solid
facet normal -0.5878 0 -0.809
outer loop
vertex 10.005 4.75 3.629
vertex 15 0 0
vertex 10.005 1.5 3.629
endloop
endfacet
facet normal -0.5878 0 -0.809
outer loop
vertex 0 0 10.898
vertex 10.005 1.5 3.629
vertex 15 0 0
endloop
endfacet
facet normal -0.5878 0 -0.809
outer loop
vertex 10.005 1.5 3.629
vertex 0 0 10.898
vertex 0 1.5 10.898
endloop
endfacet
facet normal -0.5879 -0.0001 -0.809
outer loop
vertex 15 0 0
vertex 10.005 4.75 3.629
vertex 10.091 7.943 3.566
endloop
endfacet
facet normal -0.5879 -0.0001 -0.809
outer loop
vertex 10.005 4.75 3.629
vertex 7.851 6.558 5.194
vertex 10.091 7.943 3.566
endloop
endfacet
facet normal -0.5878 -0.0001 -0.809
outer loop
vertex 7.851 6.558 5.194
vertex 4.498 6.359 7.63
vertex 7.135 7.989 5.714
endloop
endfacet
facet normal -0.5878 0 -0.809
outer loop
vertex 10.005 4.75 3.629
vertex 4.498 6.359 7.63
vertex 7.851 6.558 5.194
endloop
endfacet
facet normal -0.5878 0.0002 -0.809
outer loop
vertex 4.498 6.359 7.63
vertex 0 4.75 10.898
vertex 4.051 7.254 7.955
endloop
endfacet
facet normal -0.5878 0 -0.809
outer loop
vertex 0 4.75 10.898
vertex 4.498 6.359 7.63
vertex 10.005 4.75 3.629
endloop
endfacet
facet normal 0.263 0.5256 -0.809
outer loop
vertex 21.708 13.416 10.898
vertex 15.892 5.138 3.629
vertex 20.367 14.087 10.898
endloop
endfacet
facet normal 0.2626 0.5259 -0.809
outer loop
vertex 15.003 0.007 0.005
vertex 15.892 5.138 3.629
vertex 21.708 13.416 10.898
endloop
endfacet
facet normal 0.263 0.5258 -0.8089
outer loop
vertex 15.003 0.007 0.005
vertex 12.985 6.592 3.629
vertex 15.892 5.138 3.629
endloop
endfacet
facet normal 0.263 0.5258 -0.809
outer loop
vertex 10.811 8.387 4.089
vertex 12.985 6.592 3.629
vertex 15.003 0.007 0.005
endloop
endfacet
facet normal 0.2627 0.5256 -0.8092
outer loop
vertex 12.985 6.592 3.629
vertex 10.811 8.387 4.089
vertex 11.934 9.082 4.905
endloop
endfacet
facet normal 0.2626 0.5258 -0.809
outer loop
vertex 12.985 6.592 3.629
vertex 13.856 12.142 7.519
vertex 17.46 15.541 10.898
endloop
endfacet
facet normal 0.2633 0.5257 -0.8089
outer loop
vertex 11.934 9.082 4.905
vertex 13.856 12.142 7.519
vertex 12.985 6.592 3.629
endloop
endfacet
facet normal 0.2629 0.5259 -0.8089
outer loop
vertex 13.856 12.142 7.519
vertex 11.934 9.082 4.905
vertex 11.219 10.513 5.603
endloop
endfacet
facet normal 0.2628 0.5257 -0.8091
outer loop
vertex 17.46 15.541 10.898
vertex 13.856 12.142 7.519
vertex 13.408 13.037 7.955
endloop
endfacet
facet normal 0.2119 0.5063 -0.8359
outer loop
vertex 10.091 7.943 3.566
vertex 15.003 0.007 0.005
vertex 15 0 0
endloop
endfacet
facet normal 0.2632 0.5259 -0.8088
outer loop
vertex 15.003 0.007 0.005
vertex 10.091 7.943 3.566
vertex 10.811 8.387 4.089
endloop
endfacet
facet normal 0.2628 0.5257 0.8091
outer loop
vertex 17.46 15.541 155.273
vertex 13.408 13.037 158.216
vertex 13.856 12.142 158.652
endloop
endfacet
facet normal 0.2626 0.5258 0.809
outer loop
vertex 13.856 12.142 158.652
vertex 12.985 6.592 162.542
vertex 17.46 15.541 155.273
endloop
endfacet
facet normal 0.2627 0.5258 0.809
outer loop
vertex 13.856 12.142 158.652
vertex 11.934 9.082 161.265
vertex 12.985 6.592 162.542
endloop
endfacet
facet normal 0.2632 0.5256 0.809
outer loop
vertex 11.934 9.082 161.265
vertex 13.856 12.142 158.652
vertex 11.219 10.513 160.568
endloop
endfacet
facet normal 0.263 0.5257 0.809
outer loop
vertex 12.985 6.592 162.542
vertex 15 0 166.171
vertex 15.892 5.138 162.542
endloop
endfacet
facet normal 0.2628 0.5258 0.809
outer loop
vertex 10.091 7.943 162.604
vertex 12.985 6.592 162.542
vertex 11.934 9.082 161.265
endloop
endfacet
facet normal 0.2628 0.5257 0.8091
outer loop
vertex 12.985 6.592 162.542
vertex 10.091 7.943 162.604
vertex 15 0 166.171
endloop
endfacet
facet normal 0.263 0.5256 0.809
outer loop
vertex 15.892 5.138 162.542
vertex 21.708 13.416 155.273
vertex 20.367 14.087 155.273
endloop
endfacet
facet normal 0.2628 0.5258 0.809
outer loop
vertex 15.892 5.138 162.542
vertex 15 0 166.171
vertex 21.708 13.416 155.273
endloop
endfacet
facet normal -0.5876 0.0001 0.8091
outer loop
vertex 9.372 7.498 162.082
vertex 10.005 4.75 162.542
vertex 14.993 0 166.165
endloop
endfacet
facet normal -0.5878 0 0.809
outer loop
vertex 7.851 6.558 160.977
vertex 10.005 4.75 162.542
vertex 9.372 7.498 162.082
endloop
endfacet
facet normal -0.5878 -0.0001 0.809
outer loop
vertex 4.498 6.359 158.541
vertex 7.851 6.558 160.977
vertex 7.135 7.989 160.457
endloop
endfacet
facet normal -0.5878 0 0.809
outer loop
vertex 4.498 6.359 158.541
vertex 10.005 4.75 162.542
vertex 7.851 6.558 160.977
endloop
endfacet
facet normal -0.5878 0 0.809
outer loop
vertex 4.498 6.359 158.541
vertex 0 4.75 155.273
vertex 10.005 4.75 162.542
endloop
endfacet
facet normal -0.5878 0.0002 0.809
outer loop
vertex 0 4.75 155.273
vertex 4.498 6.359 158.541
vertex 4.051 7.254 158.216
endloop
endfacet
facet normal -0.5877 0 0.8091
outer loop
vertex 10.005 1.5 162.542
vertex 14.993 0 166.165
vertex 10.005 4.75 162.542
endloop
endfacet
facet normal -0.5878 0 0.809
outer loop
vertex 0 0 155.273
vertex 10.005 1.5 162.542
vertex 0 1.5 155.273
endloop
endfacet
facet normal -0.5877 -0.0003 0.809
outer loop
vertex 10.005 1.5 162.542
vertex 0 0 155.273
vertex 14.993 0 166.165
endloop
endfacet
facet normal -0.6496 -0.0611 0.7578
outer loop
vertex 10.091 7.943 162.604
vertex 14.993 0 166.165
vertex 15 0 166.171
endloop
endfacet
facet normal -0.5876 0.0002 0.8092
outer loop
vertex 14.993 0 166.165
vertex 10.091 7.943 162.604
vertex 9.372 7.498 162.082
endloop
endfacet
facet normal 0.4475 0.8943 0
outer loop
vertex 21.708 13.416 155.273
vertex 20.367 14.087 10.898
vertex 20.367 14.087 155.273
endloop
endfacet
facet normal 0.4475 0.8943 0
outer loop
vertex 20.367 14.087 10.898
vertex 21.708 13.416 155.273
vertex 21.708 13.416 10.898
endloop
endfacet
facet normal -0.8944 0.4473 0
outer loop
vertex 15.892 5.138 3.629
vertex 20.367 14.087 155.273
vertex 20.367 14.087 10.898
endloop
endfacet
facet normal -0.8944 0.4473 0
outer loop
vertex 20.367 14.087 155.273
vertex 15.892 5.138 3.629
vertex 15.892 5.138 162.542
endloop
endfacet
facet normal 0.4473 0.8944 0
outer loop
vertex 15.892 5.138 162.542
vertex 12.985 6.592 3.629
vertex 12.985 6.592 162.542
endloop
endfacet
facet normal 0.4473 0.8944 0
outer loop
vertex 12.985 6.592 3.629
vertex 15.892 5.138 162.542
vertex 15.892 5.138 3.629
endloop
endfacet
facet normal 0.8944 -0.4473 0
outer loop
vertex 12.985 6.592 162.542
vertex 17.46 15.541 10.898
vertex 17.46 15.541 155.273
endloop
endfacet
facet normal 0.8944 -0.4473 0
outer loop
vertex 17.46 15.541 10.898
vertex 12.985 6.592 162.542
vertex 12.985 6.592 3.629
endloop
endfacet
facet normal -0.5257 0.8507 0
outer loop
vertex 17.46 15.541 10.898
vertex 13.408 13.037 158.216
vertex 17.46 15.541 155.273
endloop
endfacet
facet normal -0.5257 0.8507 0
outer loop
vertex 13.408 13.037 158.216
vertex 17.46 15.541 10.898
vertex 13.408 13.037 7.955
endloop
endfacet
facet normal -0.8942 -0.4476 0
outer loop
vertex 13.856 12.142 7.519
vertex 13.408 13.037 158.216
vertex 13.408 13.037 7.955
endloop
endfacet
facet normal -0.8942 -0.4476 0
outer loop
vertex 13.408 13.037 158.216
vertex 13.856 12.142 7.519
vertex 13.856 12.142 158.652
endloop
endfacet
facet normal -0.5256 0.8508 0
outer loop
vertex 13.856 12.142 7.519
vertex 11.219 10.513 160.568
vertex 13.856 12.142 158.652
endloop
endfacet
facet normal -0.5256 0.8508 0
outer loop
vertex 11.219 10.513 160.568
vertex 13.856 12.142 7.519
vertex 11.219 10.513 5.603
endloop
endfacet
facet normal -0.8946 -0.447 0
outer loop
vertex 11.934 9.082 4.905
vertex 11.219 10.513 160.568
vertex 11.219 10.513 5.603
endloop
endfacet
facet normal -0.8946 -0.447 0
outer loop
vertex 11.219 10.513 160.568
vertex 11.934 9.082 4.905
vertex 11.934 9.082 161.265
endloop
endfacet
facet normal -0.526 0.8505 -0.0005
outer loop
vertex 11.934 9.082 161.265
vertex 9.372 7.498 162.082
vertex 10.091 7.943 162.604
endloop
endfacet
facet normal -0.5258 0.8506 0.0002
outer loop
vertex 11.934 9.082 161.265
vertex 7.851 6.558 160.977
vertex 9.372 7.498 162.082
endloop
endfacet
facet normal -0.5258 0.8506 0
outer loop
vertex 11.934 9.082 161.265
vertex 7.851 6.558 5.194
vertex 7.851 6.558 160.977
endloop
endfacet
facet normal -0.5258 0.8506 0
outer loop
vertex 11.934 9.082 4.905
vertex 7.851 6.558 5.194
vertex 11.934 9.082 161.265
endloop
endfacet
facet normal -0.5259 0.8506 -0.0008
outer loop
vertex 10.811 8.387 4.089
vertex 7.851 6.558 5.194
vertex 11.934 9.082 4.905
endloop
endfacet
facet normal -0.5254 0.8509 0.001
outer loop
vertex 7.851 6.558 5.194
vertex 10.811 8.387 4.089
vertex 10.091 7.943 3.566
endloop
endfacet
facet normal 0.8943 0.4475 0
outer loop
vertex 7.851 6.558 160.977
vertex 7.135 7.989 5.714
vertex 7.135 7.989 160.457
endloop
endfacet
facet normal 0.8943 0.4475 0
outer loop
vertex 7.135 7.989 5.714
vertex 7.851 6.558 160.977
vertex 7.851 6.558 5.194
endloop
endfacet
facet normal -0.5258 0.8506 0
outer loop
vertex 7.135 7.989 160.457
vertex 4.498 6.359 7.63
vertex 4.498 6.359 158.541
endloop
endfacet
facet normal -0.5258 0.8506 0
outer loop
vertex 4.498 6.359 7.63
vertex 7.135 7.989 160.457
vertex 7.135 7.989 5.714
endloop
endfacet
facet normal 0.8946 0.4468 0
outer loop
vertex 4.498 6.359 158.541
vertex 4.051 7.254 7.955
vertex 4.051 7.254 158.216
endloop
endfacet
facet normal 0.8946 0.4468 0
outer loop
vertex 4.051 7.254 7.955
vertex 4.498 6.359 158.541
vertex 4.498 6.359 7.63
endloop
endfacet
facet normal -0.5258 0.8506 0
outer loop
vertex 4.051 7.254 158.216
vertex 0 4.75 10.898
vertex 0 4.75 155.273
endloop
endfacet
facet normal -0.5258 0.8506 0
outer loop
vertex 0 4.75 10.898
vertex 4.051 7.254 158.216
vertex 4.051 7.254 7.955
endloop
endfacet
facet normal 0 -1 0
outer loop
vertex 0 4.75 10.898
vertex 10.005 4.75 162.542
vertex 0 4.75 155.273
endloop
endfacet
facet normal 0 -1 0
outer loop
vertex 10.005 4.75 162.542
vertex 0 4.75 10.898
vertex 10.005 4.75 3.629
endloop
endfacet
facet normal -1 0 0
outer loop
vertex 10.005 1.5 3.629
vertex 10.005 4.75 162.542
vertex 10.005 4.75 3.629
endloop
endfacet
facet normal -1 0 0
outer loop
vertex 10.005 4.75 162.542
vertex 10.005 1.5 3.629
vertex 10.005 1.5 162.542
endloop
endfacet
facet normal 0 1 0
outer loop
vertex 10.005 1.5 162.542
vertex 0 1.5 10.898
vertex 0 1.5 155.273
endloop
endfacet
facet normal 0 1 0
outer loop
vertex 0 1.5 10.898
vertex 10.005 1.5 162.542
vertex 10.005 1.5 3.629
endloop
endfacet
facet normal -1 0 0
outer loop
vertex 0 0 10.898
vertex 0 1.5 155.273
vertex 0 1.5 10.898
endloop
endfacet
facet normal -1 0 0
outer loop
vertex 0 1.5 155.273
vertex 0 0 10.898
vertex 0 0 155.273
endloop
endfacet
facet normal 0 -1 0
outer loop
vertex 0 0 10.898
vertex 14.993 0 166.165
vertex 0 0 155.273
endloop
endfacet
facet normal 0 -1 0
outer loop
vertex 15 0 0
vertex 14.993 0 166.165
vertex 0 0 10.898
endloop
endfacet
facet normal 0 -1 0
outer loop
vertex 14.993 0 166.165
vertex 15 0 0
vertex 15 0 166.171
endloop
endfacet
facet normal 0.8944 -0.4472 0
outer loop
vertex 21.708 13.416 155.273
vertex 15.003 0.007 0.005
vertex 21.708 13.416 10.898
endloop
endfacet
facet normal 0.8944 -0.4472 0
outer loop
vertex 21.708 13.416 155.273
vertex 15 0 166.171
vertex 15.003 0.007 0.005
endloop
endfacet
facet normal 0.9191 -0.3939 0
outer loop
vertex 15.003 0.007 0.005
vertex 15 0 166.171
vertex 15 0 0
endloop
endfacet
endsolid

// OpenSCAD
// Regular Dodecahedron Edge Ribs


// Cf. https://github.com/openscad/openscad/issues/4603 for a good discussion
// that helped resolve some of the issues in this design.

$fn = 40;

// Variable parameters to cusomize the edge ribs
paneEdge = (6 * 25.4); // paneEdge (6in x 25.4 mm/in)
edgeThickness = 1.5;   // thickness of the edge
ribWidth = 15;         // width of the rib
paneThickness = 3.25;  // thickness of the pane
channelWidth = 11;     // width of LED strip channel
channelDepth = 1;      // depth of LED strip channel
wireWidth = 3 * 1.6;   // width of wire channel (3x 22 AWG insulated wires)
wireDepth = 1.6;       // depth of wire channel (1x 22 AWG insulated wire)
dihedral = 116.56505;  // angle of polyhedron dihedral
interior = 108.0;      // angle of face interior
fudge = 0.01;          // render artifact elimination fudge factor
vertexHole = false;    // include a vertex hole for wire exit

// Calculated parameters
edge = 0.667 * ribWidth  * tan(interior / 2) + paneEdge;
echo("pane edge", paneEdge);
echo("edge", edge);

difference() {
    extruded_edge(edge, edgeThickness, ribWidth, paneThickness, channelWidth, channelDepth, wireWidth, wireDepth, dihedral);
    bevel_cuts(ribWidth, interior, dihedral);
    translate([ribWidth,0,edge]) {
        rotate([0,0,180-dihedral]) {
            translate([ribWidth,0,0]) {
                rotate([0,180,0]) {
                    bevel_cuts(ribWidth, interior, dihedral);
                }
            }
        }
    }
    if (vertexHole) {
        wire_hole(ribWidth, wireDepth, interior, dihedral);
    }
}


// Vertex Wire hole
module wire_hole(ribWidth, wireDepth, interior, dihedral) {
    translate([ribWidth,0,0]) {
        rotate([interior - 90, 0, dihedral - 90]) {
            translate([0,20,0]) {
                rotate([90,0,0]) {
                    cylinder(h = 20, r = 2.5 * wireDepth);
                }
            }
        }
    }
}

// Bevel cuts for the end of the rib
module bevel_cuts(ribWidth, interior, dihedral) {
    union() {
        angle_cut(ribWidth, interior);
        translate([ribWidth,0,0]) {
            rotate([0,0,180-dihedral]) {
                translate([ribWidth, 0, 0]) {
                    mirror([1,0,0]) {
                        angle_cut(ribWidth, interior);
                    }
                }
            }
        }
    }
}


// Half of one bevel
module angle_cut(ribWidth, interior) {

    angle_ab = 90 - (interior / 2);

    ax = 0;
    ay = 0;
    az = 0;
    bx = ribWidth;
    by = 0;
    bz = 0;
    cx = 0;
    cy = 0;
    cz = ribWidth * tan(angle_ab);
    dx = 0;
    dy = 20;
    dz = 0;
    ex = ribWidth;
    ey = 20;
    ez = 0;
    fx = 0;
    fy = 20;
    fz = ribWidth * tan(angle_ab);

    polyhedron(
        points=[
            [ax-fudge, ay-fudge, az-fudge], // point a (0)
            [bx, by-fudge, bz],             // point b (1)
            [cx, cy-fudge, cz],             // point c (2)
            [dx-fudge, dy, dz-fudge],       // point d (3)
            [ex, ey, ez],                   // point e (4)
            [fx, fy, fz]                    // point f (5)
        ],
        faces=[
            [0, 3, 5, 2], // face A
            [0, 1, 4, 3], // face B
            [1, 2, 5, 4], // face C
            [3, 4, 5],    // face D
            [0, 2, 1]     // face E
        ],
        convexity=10
    );
};


// Rib extrusion
module extruded_edge(edge, edgeThickness, ribWidth, paneThickness, channelWidth, channelDepth, wireWidth, wireDepth, dihedral) {

    linear_extrude(height=edge, center=false, convexity=10, twist=0, slices=20, scale=1) {
        
        ax = 0;
        ay = 0;
        bx = ribWidth;
        by = 0;
        cx = ribWidth + ribWidth * cos(180 - dihedral);
        cy = ribWidth * sin(180 - dihedral);
        dx = cx - edgeThickness * cos(dihedral - 90);
        dy = cy + edgeThickness * sin(dihedral - 90);
        ex = dx - 0.667 * ribWidth * cos(180 - dihedral);
        ey = dy - 0.667 * ribWidth * sin(180 - dihedral);
        fx = ex - paneThickness * cos(dihedral - 90);
        fy = ey + paneThickness * sin(dihedral - 90);
        gx = fx + 0.667 * ribWidth * cos(180 - dihedral);
        gy = fy + 0.667 * ribWidth * sin(180 - dihedral);
        px = 0;
        py = edgeThickness + paneThickness;
        qx = 0.667 * ribWidth;
        qy = py;
        rx = qx;
        ry = edgeThickness;
        sx = 0;
        sy = ry; 

        angle_opq = atan((gy - py) / gx);  // derived angle of inside edge
        gp = gx / cos(angle_opq);          // total width of inside edge
        gh = 0.5 * (gp - channelWidth);    // width of offset on either side of the LED channel
        ho = gp - 2 * gh;                  // derived width of LED channel (should match specified)
        jm = wireWidth;                    // total width of wire channel
        ij = 0.5 * (ho - jm);              // width of offset on either side of wire channel within the LED channel
        assert(ho == channelWidth, "Derived channel width does not match specified width");
        assert(jm < ho, "Total wire channel width exceeds the width of the LED strip");

        hx = gx - gh * cos(angle_opq);
        hy = gy - gh * sin(angle_opq);
        ix = hx + channelDepth * sin(90 - 2 * angle_opq);
        iy = hy - channelDepth * cos(90 - 2 * angle_opq);
        ox = px + gh * cos(angle_opq);
        oy = py + gh * sin(angle_opq);
        nx = ox + channelDepth * sin(90 - 2 * angle_opq);
        ny = oy - channelDepth * cos(90 - 2 * angle_opq);
        jx = ix - ij * cos(angle_opq);
        jy = iy - ij * sin(angle_opq);
        kx = jx + wireDepth * sin(90 - 2 * angle_opq);
        ky = jy - wireDepth * cos(90 - 2 * angle_opq);
        mx = nx + ij * cos(angle_opq);
        my = ny + ij * sin(angle_opq);
        lx = mx + wireDepth * sin(90 - 2 * angle_opq);
        ly = my - wireDepth * cos(90 - 2 * angle_opq);
                
        polygon([
            [ax, ay], // point 'a'
            [bx, by], // point 'b'
            [cx, cy], // point 'c'
            [dx, dy], // point 'd'
            [ex, ey], // point 'e'
            [fx, fy], // point 'f'
            [gx, gy], // point 'g'
            [hx, hy], // point 'h'
            [ix, iy], // point 'i'
            [jx, jy], // point 'j'
            [kx, ky], // point 'k'
            [lx, ly], // point 'l'
            [mx, my], // point 'm'
            [nx, ny], // point 'n'
            [ox, oy], // point 'o'
            [px, py], // point 'p'
            [qx, qy], // point 'q'
            [rx, ry], // point 'r'
            [sx, sy]  // point 's'
        ]);
    }
};
